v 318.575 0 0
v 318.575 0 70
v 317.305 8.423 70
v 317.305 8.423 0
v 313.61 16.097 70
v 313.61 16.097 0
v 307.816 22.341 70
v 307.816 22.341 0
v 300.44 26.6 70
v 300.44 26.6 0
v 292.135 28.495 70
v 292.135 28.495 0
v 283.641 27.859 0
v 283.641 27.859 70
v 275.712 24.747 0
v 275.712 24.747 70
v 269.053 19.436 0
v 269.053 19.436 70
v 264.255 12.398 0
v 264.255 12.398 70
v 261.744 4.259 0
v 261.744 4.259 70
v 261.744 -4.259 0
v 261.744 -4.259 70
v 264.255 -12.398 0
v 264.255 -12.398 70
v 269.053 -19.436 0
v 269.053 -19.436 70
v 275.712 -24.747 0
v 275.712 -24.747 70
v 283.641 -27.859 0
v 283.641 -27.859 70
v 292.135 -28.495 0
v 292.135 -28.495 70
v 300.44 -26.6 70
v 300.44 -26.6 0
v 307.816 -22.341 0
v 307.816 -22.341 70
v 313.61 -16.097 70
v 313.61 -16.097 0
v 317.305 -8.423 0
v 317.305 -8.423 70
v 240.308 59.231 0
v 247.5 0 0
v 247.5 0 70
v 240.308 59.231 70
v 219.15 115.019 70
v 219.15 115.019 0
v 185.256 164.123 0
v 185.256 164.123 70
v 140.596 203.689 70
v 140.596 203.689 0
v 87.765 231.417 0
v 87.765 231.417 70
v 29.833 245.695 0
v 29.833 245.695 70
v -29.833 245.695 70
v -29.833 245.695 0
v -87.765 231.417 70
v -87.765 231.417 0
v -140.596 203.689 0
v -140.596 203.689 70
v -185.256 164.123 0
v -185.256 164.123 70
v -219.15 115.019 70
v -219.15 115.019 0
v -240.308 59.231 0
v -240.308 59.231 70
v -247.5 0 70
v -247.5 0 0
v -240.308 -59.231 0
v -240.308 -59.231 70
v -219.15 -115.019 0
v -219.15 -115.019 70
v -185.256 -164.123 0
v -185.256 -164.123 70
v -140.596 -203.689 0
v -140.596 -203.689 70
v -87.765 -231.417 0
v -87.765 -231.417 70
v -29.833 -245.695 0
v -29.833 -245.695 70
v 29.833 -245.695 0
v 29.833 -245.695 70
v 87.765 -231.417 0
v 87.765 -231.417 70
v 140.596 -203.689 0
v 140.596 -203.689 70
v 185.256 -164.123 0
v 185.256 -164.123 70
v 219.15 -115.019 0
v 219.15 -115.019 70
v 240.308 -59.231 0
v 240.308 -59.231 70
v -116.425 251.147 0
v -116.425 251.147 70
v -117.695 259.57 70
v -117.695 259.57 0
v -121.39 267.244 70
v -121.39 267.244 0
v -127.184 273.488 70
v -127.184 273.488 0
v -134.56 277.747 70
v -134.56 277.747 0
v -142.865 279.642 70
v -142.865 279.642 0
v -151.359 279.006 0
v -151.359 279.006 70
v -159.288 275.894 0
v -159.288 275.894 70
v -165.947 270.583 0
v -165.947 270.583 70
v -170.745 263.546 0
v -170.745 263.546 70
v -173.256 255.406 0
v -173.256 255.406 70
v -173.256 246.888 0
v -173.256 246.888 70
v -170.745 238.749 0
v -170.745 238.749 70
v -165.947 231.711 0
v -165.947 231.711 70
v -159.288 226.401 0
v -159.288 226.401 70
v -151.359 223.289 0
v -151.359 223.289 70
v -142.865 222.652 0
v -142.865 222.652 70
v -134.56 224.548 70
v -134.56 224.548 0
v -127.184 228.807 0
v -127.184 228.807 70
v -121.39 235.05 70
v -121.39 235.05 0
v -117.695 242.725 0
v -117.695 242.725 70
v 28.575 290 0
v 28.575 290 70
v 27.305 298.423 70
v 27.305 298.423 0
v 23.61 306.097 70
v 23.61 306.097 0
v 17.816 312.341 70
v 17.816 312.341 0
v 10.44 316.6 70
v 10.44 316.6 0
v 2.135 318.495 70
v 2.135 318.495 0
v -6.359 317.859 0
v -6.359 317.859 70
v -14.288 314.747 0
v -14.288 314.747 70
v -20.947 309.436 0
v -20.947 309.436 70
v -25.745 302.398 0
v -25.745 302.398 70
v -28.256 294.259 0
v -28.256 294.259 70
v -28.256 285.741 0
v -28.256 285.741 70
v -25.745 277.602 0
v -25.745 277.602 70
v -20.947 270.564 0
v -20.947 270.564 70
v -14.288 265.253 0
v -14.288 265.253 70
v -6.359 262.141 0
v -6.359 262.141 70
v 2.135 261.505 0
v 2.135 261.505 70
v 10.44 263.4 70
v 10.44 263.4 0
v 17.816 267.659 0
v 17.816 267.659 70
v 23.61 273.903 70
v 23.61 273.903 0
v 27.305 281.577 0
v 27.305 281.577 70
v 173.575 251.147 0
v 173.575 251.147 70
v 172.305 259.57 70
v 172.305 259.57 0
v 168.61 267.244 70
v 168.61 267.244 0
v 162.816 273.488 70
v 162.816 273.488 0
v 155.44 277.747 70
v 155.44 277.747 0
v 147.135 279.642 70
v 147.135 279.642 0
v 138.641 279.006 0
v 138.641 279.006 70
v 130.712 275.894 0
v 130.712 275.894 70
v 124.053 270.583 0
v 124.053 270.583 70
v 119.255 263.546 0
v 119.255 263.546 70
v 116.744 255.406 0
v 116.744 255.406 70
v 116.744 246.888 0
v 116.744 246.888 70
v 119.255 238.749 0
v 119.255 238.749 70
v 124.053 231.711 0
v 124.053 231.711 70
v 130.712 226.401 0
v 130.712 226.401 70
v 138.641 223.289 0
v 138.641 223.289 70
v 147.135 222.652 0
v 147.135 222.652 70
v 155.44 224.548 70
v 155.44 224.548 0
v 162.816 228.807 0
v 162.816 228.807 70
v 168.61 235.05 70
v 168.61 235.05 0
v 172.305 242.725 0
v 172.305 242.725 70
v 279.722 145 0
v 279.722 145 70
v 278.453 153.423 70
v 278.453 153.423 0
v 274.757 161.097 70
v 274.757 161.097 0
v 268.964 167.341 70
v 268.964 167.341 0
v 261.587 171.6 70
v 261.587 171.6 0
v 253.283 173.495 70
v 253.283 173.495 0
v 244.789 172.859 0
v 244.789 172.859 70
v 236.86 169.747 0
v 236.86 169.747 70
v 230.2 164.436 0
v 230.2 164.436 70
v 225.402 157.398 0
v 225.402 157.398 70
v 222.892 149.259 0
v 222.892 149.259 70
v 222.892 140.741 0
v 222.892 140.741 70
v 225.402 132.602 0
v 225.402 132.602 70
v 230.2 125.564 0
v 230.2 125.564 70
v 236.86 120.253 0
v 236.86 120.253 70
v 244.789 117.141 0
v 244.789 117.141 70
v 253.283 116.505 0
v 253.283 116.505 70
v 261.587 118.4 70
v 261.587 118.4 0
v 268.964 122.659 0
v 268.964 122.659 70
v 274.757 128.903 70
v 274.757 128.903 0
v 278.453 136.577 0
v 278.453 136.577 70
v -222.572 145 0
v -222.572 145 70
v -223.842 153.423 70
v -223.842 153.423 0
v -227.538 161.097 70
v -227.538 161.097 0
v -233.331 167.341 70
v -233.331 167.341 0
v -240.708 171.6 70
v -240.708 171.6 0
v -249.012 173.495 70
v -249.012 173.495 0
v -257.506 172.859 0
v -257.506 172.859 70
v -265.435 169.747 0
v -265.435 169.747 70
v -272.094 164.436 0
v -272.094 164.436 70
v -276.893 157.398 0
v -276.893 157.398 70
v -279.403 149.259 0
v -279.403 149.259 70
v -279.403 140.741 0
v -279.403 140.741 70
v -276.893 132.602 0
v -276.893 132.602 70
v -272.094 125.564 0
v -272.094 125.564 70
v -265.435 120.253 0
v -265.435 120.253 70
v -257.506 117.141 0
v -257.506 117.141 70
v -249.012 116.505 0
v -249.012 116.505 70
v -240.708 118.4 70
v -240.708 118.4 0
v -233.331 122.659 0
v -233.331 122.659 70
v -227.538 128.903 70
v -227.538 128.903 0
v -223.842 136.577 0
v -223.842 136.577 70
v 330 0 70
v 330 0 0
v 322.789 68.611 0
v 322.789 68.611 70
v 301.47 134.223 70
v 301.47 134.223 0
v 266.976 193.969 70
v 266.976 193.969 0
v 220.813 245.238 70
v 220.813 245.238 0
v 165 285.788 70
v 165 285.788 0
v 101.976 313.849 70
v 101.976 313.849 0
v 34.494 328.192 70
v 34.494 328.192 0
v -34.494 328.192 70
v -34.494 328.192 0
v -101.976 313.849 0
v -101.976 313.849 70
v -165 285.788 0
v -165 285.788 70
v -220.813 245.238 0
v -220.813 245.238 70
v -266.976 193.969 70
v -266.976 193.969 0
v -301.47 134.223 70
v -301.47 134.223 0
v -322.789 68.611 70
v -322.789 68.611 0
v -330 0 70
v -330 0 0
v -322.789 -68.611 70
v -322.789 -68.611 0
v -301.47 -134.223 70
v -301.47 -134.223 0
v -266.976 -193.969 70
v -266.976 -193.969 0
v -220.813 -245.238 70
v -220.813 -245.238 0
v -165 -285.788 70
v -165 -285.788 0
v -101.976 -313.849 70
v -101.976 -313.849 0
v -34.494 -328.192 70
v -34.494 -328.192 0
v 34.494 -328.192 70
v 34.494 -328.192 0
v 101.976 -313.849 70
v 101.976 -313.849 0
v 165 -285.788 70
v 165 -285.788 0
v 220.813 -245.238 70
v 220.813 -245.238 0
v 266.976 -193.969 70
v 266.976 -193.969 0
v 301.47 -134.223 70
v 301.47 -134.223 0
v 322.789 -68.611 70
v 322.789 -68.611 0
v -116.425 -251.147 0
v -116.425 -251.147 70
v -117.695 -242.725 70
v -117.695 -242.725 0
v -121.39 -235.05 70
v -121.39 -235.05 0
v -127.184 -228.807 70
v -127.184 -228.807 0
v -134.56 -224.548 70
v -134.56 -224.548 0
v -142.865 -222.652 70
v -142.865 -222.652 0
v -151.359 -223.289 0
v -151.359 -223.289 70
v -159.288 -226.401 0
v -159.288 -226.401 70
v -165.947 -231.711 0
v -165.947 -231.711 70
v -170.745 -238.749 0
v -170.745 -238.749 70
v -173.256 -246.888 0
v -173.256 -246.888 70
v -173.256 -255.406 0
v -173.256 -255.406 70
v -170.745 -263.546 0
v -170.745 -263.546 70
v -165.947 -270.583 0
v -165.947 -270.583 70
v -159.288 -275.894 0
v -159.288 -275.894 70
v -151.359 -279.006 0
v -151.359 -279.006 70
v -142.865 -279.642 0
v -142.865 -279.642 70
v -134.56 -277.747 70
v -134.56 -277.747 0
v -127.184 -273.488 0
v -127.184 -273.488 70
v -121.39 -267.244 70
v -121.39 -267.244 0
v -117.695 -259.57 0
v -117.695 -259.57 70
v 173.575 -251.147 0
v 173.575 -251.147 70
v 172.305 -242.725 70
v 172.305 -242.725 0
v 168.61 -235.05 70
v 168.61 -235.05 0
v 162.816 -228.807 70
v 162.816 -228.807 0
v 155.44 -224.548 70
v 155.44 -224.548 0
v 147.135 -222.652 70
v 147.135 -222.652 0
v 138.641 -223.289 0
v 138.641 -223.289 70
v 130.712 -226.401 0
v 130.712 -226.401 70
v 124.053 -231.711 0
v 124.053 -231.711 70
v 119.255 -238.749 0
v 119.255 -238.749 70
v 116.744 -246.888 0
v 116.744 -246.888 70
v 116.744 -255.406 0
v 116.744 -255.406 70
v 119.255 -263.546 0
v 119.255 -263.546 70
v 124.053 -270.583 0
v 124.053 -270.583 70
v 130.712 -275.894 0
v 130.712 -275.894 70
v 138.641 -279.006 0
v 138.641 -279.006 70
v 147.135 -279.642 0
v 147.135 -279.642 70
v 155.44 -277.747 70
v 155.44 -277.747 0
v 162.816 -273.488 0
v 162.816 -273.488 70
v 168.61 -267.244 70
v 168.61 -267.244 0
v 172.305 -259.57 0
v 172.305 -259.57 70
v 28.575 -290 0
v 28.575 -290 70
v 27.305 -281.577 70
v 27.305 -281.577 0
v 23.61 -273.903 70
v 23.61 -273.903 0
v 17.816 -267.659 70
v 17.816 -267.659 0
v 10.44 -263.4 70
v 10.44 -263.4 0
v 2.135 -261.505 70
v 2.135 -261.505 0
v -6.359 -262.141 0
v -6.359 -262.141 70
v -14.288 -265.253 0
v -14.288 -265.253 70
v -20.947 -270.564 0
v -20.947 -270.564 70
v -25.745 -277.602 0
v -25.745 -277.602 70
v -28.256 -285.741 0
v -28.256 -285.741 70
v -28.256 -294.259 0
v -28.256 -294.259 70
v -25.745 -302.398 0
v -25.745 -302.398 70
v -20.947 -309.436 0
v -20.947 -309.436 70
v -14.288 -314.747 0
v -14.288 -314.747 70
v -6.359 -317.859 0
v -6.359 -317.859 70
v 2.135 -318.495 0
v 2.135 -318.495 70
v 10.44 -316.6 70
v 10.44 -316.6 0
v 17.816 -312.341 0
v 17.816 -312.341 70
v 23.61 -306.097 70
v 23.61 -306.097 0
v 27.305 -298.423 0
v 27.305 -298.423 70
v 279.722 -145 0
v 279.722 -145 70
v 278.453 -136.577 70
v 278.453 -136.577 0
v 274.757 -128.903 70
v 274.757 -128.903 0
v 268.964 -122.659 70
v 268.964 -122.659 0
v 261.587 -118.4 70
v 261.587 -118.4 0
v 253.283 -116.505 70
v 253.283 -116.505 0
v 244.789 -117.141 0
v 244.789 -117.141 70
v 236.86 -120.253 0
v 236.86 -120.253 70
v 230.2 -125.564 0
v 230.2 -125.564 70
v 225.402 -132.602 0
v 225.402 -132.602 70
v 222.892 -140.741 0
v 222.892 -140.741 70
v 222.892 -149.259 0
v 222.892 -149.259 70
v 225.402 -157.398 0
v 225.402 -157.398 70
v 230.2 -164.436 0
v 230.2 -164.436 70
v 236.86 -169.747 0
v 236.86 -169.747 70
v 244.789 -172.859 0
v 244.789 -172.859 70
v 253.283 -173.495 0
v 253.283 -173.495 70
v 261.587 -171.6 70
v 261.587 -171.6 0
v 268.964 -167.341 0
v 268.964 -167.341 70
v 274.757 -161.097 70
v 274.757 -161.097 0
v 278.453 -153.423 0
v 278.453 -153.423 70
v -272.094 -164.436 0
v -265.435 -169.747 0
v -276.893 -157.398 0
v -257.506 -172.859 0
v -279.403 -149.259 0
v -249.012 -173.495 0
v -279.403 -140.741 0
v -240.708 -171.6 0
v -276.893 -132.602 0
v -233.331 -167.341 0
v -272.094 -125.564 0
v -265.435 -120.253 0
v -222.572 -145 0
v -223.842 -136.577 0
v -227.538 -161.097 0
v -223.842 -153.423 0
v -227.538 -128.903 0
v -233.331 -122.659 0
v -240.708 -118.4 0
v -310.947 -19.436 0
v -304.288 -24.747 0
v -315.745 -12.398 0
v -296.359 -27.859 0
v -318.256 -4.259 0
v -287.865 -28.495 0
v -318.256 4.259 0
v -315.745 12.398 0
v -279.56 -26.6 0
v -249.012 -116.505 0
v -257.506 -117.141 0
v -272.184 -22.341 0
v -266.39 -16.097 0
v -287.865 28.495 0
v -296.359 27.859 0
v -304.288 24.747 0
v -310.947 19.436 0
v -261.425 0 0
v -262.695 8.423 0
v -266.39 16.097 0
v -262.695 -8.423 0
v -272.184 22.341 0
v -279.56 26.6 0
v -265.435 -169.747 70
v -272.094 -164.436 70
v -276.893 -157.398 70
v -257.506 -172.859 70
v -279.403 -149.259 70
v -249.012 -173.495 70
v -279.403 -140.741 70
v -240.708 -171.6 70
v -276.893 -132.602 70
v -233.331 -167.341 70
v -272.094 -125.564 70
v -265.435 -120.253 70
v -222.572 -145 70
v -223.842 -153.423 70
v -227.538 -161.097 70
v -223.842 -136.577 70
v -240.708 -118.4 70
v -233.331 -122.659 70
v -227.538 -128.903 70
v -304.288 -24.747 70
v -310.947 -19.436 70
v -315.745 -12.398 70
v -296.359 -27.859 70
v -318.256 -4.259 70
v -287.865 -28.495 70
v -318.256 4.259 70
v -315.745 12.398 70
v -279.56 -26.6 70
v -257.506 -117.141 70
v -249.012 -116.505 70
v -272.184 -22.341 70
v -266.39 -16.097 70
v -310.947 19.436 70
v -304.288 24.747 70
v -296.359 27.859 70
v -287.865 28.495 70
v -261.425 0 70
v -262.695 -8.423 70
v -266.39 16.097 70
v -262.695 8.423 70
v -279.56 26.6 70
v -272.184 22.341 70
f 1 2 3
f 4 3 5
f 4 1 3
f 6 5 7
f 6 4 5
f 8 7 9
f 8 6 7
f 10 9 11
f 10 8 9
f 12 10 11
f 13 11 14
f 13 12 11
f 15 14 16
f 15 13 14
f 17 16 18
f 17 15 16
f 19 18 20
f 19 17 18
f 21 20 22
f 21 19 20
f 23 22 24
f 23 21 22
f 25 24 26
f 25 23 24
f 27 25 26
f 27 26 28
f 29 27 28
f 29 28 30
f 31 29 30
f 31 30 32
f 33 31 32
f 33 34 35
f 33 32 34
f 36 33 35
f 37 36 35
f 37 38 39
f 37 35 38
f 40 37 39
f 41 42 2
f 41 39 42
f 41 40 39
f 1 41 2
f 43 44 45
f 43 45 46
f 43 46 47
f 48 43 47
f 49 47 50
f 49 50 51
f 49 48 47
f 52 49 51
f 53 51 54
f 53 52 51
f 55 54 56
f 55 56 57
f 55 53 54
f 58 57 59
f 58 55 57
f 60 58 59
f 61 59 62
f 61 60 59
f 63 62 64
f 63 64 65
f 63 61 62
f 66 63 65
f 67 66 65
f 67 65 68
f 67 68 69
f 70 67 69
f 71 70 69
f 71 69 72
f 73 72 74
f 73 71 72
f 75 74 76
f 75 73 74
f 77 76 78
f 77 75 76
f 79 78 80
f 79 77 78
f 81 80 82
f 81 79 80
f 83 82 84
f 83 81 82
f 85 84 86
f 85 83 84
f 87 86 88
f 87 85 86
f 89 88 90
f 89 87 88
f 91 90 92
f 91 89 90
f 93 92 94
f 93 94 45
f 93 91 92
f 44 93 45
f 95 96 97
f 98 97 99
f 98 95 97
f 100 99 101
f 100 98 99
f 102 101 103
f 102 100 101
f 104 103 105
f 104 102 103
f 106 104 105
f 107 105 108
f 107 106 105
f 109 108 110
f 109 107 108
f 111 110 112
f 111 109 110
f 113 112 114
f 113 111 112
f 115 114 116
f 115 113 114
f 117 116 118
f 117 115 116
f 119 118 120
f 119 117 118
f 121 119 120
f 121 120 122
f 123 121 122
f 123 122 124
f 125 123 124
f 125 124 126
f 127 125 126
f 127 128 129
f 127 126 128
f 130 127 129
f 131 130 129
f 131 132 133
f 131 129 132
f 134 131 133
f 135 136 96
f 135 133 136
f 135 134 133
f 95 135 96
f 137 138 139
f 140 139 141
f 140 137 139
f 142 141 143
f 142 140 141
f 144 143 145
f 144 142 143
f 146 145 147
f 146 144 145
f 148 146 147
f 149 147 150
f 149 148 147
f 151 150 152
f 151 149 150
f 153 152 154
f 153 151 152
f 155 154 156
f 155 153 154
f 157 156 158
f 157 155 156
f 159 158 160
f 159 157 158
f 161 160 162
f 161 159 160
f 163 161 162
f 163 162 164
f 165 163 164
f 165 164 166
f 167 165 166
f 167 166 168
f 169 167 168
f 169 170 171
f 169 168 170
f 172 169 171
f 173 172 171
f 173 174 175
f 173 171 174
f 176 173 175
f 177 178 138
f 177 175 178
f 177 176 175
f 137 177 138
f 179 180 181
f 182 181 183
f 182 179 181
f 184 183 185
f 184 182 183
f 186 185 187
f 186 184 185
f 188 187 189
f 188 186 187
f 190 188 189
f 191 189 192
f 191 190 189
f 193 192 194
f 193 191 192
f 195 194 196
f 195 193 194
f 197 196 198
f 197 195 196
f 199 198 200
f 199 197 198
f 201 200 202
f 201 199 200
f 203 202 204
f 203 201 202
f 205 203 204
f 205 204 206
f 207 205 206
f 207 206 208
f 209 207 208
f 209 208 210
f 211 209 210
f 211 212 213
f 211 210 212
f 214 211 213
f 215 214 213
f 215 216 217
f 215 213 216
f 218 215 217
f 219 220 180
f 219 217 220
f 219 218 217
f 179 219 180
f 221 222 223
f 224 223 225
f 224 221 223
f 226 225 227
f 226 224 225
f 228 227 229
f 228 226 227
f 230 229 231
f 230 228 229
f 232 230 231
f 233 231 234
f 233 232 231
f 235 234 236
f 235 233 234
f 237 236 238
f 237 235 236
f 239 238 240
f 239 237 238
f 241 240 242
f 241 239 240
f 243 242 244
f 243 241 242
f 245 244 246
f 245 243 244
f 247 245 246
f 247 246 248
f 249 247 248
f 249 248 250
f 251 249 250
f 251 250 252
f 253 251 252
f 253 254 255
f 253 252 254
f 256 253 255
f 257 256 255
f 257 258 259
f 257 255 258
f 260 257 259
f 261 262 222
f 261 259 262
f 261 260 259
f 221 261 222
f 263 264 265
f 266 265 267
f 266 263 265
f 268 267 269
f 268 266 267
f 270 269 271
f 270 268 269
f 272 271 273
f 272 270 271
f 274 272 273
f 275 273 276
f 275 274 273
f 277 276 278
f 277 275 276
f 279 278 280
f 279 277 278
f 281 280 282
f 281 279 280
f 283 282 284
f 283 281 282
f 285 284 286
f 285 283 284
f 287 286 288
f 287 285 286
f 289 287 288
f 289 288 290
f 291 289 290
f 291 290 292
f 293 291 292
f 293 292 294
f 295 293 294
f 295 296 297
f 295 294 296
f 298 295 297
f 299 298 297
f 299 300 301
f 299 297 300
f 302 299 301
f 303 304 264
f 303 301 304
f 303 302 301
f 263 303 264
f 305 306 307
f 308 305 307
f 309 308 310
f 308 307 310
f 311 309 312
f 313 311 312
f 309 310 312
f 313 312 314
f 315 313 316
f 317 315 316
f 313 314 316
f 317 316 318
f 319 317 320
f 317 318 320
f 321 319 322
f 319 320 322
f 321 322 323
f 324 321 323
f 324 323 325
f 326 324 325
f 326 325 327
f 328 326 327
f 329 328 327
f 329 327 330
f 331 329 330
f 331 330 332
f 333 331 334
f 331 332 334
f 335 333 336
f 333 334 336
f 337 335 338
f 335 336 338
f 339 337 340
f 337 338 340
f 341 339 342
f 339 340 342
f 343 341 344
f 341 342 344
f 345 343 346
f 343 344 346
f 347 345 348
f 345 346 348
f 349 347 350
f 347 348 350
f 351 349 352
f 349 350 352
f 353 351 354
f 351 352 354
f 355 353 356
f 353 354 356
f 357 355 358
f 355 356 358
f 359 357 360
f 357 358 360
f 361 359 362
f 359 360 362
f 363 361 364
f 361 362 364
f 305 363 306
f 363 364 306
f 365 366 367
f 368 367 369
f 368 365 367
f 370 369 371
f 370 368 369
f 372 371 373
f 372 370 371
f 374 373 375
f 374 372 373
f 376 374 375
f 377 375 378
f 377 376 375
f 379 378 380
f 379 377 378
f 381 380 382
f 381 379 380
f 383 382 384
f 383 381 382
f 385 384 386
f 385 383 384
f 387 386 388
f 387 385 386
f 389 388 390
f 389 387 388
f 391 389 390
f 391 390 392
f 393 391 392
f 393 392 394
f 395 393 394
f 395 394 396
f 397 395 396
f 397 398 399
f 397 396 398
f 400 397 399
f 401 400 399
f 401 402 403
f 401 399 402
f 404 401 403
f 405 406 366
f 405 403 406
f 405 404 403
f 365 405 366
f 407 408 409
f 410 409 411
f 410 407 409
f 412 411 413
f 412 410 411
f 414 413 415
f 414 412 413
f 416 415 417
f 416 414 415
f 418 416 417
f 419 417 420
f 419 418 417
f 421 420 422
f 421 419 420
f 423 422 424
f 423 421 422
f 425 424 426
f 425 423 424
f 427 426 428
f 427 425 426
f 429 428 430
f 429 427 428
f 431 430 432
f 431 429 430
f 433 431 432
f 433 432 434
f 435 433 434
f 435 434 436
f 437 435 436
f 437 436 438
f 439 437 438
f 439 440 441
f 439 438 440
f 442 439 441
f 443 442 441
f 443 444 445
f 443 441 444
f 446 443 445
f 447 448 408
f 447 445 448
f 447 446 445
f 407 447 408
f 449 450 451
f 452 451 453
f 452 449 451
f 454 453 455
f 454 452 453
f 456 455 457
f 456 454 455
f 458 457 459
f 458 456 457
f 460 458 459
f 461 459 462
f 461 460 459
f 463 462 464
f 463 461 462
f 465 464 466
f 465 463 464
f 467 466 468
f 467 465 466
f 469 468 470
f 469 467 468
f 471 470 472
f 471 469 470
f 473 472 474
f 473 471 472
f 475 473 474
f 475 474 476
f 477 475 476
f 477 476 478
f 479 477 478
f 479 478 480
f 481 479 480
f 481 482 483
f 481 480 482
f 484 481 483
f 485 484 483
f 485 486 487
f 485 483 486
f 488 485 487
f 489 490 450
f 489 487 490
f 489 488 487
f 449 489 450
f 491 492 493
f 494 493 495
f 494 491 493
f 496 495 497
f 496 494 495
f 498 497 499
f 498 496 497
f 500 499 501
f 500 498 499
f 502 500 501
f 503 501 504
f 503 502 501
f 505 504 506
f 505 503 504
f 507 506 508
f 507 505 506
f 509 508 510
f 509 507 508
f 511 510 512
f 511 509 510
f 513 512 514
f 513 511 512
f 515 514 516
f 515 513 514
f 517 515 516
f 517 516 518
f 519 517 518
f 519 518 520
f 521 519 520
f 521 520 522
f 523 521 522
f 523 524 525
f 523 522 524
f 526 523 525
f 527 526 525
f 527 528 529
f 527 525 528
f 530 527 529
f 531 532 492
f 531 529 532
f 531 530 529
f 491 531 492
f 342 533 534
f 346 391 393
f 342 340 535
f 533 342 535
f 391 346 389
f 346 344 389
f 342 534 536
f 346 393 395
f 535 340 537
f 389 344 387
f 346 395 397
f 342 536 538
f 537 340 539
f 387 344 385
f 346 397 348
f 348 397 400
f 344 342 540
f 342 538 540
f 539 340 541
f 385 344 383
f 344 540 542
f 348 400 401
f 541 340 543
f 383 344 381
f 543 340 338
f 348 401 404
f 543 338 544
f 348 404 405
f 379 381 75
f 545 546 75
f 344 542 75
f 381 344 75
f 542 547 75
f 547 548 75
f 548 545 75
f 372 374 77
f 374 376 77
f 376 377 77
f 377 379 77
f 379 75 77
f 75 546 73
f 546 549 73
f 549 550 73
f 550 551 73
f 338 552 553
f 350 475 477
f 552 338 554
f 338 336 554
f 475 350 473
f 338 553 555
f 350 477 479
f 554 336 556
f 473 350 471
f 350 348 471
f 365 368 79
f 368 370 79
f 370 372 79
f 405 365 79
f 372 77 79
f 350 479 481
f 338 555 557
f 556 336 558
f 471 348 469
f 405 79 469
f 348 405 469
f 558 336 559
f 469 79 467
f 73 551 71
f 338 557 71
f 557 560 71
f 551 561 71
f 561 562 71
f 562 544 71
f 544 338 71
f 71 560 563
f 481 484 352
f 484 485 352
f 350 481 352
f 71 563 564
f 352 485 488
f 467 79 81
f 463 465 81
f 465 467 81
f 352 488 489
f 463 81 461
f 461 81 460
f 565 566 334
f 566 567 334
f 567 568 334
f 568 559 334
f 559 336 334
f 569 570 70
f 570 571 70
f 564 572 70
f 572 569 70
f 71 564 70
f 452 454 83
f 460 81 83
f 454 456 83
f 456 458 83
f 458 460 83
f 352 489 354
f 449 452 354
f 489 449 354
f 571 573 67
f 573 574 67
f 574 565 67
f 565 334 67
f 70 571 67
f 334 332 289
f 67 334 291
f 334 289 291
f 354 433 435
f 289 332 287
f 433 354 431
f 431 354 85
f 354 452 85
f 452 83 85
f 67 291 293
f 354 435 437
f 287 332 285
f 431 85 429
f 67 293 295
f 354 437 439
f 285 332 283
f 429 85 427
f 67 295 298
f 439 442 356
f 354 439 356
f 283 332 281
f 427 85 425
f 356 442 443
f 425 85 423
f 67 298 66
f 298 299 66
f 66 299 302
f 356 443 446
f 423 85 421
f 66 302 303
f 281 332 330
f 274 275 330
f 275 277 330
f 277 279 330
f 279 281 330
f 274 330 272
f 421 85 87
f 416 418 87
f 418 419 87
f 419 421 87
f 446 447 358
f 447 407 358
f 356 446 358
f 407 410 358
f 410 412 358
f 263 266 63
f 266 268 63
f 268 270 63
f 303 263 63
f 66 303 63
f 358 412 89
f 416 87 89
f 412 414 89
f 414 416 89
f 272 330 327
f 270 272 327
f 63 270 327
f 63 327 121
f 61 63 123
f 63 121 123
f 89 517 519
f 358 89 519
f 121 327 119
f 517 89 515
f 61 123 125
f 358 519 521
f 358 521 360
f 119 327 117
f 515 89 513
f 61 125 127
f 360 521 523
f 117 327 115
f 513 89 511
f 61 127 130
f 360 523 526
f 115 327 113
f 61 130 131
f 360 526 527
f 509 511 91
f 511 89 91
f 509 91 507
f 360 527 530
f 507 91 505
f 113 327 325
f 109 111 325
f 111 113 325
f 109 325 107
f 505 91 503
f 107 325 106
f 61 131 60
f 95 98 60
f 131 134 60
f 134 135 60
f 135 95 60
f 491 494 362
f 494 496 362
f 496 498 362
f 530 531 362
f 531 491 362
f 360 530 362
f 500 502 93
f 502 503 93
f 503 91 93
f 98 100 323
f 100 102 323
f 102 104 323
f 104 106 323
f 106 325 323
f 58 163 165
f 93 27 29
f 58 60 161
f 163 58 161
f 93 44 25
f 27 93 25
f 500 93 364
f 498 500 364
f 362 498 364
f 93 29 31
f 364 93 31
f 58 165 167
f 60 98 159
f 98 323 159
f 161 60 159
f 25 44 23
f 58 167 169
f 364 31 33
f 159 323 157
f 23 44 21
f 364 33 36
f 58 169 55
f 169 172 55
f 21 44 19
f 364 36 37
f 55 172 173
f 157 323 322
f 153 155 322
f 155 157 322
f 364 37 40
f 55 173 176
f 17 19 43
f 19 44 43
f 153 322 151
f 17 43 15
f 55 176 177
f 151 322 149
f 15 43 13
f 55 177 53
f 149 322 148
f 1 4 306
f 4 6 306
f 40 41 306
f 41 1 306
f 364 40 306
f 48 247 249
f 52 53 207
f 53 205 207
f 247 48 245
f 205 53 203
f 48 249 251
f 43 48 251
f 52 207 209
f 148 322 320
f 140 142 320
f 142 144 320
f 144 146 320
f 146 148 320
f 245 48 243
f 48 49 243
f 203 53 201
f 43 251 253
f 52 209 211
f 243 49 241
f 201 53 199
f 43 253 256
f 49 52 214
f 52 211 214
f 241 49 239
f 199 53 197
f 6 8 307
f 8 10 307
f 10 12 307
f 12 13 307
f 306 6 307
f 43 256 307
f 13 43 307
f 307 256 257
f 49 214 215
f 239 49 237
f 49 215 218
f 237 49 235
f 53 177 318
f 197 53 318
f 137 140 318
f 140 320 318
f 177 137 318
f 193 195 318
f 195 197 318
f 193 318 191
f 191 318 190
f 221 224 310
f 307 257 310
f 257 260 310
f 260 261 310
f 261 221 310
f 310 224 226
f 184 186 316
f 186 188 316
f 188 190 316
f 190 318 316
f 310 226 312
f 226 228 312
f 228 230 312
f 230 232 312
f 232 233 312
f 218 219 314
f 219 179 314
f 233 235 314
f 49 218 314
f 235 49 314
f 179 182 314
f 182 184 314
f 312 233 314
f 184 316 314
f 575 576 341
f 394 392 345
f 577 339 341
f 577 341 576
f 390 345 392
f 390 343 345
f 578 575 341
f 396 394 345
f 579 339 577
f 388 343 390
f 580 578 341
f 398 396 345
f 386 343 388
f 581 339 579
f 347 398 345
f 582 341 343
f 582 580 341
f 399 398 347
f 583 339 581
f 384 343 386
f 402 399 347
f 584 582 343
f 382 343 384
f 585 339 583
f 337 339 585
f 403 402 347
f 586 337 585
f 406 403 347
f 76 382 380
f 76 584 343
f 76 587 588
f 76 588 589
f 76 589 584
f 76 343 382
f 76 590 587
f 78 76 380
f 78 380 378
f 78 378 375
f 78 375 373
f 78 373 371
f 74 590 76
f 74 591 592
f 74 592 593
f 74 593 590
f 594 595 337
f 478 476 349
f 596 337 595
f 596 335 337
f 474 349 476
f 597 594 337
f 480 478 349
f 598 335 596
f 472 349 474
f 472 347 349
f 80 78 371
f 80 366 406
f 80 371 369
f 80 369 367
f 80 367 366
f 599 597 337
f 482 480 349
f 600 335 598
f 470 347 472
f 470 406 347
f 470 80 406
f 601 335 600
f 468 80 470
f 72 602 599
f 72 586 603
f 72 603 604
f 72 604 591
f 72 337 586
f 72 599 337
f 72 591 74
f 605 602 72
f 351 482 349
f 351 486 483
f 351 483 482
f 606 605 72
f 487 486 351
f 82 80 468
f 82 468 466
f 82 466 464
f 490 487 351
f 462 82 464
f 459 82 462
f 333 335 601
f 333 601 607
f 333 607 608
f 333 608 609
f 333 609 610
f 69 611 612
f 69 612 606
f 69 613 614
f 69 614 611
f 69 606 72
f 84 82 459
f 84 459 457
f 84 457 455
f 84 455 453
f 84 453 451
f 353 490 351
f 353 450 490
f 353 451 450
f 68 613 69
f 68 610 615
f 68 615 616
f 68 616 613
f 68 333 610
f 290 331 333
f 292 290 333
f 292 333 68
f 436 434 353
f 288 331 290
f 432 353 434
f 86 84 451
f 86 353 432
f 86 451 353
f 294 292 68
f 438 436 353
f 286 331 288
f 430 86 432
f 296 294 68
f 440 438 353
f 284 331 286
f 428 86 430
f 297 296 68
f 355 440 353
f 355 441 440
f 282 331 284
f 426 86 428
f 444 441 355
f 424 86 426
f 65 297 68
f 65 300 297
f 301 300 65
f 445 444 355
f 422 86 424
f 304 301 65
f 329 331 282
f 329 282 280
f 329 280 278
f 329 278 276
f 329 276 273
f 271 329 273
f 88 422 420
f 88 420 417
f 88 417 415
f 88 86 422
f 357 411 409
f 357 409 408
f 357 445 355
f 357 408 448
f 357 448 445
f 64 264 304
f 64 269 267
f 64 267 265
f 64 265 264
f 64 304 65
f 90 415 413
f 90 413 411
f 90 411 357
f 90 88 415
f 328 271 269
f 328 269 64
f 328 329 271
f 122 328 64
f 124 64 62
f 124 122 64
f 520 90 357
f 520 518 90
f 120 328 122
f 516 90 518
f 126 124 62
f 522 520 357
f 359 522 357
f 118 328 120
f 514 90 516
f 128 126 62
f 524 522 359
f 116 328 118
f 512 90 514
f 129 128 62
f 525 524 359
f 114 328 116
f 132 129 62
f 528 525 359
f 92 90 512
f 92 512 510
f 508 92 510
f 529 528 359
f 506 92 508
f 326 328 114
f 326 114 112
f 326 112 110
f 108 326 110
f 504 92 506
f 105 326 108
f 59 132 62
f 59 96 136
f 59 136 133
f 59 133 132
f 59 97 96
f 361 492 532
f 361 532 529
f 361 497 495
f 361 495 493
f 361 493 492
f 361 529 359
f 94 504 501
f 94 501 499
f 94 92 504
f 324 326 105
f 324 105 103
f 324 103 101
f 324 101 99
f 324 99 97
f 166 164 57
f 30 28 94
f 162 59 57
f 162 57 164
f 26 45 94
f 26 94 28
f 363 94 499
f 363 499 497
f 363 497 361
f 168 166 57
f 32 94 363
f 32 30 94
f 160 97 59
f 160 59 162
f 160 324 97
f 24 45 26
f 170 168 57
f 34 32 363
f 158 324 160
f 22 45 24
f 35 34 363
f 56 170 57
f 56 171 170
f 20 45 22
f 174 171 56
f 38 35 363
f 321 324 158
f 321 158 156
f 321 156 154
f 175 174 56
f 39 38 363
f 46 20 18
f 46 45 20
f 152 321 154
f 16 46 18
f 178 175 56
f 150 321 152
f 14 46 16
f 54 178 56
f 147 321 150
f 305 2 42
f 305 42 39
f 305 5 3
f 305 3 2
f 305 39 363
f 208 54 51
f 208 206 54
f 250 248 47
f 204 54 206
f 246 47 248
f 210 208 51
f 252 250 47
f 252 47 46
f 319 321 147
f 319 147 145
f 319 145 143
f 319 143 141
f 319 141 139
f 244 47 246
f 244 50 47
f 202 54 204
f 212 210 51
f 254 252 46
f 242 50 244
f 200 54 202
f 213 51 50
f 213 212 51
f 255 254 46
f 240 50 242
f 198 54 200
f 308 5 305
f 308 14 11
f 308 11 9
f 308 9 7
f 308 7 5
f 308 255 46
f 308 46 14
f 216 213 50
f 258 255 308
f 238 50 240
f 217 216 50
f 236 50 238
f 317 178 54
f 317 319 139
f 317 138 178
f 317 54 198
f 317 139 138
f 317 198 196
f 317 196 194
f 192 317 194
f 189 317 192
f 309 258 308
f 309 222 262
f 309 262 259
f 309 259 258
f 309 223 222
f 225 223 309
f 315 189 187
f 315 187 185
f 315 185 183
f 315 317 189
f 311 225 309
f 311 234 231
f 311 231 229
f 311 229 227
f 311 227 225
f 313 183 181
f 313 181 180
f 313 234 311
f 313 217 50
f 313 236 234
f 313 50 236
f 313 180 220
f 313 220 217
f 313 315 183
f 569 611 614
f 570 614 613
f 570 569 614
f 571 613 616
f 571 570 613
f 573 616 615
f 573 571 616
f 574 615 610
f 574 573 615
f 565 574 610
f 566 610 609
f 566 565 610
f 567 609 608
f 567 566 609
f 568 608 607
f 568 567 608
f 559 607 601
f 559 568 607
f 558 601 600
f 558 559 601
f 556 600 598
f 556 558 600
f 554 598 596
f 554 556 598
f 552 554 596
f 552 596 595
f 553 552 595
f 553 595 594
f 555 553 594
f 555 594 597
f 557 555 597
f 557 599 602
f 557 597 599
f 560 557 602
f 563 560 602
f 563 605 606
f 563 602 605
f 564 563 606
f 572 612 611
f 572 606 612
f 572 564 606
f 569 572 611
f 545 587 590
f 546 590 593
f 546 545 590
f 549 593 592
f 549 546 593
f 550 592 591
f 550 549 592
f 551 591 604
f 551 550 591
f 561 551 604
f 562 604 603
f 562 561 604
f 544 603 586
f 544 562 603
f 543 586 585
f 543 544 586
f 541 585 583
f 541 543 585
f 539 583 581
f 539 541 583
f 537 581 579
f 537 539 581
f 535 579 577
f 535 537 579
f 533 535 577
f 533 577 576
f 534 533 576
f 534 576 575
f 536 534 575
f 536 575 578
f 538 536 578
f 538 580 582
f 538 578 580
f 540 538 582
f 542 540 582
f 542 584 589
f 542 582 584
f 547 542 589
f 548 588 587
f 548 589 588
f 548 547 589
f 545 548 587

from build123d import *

# Parameters (mm, degrees)
SKETCH1_R           = 330
SKETCH1_R_2         = 247.5
BOSS_EXTRUDE1_DEPTH = 70
SKETCH2_R           = 28.575
CUT_EXTRUDE1_DEPTH  = 131


with BuildPart() as part:
    # Sketch1 → Boss-Extrude1 (new body)
    with BuildSketch(Plane.XY):
        Circle(SKETCH1_R)
        Circle(SKETCH1_R_2, mode=Mode.SUBTRACT)
    extrude(amount=BOSS_EXTRUDE1_DEPTH)

    # Sketch2 → Cut-Extrude1 (cut)
    with BuildSketch(Plane.XY):
        with Locations((0, 290)):
            Circle(SKETCH2_R)
        with Locations((145, 251.147367097)):
            Circle(SKETCH2_R)
        with Locations((251.147367097, 145)):
            Circle(SKETCH2_R)
        with Locations((290, 0)):
            Circle(SKETCH2_R)
        with Locations((251.147367098, -145)):
            Circle(SKETCH2_R)
        with Locations((145, -251.147367097)):
            Circle(SKETCH2_R)
        with Locations((0, -290)):
            Circle(SKETCH2_R)
        with Locations((-145, -251.147367097)):
            Circle(SKETCH2_R)
        with Locations((-251.147367097, -145)):
            Circle(SKETCH2_R)
        with Locations((-290, 0)):
            Circle(SKETCH2_R)
        with Locations((-251.147367097, 145)):
            Circle(SKETCH2_R)
        with Locations((-145, 251.147367097)):
            Circle(SKETCH2_R)
    extrude(amount=CUT_EXTRUDE1_DEPTH, mode=Mode.SUBTRACT)


solid = part.part
